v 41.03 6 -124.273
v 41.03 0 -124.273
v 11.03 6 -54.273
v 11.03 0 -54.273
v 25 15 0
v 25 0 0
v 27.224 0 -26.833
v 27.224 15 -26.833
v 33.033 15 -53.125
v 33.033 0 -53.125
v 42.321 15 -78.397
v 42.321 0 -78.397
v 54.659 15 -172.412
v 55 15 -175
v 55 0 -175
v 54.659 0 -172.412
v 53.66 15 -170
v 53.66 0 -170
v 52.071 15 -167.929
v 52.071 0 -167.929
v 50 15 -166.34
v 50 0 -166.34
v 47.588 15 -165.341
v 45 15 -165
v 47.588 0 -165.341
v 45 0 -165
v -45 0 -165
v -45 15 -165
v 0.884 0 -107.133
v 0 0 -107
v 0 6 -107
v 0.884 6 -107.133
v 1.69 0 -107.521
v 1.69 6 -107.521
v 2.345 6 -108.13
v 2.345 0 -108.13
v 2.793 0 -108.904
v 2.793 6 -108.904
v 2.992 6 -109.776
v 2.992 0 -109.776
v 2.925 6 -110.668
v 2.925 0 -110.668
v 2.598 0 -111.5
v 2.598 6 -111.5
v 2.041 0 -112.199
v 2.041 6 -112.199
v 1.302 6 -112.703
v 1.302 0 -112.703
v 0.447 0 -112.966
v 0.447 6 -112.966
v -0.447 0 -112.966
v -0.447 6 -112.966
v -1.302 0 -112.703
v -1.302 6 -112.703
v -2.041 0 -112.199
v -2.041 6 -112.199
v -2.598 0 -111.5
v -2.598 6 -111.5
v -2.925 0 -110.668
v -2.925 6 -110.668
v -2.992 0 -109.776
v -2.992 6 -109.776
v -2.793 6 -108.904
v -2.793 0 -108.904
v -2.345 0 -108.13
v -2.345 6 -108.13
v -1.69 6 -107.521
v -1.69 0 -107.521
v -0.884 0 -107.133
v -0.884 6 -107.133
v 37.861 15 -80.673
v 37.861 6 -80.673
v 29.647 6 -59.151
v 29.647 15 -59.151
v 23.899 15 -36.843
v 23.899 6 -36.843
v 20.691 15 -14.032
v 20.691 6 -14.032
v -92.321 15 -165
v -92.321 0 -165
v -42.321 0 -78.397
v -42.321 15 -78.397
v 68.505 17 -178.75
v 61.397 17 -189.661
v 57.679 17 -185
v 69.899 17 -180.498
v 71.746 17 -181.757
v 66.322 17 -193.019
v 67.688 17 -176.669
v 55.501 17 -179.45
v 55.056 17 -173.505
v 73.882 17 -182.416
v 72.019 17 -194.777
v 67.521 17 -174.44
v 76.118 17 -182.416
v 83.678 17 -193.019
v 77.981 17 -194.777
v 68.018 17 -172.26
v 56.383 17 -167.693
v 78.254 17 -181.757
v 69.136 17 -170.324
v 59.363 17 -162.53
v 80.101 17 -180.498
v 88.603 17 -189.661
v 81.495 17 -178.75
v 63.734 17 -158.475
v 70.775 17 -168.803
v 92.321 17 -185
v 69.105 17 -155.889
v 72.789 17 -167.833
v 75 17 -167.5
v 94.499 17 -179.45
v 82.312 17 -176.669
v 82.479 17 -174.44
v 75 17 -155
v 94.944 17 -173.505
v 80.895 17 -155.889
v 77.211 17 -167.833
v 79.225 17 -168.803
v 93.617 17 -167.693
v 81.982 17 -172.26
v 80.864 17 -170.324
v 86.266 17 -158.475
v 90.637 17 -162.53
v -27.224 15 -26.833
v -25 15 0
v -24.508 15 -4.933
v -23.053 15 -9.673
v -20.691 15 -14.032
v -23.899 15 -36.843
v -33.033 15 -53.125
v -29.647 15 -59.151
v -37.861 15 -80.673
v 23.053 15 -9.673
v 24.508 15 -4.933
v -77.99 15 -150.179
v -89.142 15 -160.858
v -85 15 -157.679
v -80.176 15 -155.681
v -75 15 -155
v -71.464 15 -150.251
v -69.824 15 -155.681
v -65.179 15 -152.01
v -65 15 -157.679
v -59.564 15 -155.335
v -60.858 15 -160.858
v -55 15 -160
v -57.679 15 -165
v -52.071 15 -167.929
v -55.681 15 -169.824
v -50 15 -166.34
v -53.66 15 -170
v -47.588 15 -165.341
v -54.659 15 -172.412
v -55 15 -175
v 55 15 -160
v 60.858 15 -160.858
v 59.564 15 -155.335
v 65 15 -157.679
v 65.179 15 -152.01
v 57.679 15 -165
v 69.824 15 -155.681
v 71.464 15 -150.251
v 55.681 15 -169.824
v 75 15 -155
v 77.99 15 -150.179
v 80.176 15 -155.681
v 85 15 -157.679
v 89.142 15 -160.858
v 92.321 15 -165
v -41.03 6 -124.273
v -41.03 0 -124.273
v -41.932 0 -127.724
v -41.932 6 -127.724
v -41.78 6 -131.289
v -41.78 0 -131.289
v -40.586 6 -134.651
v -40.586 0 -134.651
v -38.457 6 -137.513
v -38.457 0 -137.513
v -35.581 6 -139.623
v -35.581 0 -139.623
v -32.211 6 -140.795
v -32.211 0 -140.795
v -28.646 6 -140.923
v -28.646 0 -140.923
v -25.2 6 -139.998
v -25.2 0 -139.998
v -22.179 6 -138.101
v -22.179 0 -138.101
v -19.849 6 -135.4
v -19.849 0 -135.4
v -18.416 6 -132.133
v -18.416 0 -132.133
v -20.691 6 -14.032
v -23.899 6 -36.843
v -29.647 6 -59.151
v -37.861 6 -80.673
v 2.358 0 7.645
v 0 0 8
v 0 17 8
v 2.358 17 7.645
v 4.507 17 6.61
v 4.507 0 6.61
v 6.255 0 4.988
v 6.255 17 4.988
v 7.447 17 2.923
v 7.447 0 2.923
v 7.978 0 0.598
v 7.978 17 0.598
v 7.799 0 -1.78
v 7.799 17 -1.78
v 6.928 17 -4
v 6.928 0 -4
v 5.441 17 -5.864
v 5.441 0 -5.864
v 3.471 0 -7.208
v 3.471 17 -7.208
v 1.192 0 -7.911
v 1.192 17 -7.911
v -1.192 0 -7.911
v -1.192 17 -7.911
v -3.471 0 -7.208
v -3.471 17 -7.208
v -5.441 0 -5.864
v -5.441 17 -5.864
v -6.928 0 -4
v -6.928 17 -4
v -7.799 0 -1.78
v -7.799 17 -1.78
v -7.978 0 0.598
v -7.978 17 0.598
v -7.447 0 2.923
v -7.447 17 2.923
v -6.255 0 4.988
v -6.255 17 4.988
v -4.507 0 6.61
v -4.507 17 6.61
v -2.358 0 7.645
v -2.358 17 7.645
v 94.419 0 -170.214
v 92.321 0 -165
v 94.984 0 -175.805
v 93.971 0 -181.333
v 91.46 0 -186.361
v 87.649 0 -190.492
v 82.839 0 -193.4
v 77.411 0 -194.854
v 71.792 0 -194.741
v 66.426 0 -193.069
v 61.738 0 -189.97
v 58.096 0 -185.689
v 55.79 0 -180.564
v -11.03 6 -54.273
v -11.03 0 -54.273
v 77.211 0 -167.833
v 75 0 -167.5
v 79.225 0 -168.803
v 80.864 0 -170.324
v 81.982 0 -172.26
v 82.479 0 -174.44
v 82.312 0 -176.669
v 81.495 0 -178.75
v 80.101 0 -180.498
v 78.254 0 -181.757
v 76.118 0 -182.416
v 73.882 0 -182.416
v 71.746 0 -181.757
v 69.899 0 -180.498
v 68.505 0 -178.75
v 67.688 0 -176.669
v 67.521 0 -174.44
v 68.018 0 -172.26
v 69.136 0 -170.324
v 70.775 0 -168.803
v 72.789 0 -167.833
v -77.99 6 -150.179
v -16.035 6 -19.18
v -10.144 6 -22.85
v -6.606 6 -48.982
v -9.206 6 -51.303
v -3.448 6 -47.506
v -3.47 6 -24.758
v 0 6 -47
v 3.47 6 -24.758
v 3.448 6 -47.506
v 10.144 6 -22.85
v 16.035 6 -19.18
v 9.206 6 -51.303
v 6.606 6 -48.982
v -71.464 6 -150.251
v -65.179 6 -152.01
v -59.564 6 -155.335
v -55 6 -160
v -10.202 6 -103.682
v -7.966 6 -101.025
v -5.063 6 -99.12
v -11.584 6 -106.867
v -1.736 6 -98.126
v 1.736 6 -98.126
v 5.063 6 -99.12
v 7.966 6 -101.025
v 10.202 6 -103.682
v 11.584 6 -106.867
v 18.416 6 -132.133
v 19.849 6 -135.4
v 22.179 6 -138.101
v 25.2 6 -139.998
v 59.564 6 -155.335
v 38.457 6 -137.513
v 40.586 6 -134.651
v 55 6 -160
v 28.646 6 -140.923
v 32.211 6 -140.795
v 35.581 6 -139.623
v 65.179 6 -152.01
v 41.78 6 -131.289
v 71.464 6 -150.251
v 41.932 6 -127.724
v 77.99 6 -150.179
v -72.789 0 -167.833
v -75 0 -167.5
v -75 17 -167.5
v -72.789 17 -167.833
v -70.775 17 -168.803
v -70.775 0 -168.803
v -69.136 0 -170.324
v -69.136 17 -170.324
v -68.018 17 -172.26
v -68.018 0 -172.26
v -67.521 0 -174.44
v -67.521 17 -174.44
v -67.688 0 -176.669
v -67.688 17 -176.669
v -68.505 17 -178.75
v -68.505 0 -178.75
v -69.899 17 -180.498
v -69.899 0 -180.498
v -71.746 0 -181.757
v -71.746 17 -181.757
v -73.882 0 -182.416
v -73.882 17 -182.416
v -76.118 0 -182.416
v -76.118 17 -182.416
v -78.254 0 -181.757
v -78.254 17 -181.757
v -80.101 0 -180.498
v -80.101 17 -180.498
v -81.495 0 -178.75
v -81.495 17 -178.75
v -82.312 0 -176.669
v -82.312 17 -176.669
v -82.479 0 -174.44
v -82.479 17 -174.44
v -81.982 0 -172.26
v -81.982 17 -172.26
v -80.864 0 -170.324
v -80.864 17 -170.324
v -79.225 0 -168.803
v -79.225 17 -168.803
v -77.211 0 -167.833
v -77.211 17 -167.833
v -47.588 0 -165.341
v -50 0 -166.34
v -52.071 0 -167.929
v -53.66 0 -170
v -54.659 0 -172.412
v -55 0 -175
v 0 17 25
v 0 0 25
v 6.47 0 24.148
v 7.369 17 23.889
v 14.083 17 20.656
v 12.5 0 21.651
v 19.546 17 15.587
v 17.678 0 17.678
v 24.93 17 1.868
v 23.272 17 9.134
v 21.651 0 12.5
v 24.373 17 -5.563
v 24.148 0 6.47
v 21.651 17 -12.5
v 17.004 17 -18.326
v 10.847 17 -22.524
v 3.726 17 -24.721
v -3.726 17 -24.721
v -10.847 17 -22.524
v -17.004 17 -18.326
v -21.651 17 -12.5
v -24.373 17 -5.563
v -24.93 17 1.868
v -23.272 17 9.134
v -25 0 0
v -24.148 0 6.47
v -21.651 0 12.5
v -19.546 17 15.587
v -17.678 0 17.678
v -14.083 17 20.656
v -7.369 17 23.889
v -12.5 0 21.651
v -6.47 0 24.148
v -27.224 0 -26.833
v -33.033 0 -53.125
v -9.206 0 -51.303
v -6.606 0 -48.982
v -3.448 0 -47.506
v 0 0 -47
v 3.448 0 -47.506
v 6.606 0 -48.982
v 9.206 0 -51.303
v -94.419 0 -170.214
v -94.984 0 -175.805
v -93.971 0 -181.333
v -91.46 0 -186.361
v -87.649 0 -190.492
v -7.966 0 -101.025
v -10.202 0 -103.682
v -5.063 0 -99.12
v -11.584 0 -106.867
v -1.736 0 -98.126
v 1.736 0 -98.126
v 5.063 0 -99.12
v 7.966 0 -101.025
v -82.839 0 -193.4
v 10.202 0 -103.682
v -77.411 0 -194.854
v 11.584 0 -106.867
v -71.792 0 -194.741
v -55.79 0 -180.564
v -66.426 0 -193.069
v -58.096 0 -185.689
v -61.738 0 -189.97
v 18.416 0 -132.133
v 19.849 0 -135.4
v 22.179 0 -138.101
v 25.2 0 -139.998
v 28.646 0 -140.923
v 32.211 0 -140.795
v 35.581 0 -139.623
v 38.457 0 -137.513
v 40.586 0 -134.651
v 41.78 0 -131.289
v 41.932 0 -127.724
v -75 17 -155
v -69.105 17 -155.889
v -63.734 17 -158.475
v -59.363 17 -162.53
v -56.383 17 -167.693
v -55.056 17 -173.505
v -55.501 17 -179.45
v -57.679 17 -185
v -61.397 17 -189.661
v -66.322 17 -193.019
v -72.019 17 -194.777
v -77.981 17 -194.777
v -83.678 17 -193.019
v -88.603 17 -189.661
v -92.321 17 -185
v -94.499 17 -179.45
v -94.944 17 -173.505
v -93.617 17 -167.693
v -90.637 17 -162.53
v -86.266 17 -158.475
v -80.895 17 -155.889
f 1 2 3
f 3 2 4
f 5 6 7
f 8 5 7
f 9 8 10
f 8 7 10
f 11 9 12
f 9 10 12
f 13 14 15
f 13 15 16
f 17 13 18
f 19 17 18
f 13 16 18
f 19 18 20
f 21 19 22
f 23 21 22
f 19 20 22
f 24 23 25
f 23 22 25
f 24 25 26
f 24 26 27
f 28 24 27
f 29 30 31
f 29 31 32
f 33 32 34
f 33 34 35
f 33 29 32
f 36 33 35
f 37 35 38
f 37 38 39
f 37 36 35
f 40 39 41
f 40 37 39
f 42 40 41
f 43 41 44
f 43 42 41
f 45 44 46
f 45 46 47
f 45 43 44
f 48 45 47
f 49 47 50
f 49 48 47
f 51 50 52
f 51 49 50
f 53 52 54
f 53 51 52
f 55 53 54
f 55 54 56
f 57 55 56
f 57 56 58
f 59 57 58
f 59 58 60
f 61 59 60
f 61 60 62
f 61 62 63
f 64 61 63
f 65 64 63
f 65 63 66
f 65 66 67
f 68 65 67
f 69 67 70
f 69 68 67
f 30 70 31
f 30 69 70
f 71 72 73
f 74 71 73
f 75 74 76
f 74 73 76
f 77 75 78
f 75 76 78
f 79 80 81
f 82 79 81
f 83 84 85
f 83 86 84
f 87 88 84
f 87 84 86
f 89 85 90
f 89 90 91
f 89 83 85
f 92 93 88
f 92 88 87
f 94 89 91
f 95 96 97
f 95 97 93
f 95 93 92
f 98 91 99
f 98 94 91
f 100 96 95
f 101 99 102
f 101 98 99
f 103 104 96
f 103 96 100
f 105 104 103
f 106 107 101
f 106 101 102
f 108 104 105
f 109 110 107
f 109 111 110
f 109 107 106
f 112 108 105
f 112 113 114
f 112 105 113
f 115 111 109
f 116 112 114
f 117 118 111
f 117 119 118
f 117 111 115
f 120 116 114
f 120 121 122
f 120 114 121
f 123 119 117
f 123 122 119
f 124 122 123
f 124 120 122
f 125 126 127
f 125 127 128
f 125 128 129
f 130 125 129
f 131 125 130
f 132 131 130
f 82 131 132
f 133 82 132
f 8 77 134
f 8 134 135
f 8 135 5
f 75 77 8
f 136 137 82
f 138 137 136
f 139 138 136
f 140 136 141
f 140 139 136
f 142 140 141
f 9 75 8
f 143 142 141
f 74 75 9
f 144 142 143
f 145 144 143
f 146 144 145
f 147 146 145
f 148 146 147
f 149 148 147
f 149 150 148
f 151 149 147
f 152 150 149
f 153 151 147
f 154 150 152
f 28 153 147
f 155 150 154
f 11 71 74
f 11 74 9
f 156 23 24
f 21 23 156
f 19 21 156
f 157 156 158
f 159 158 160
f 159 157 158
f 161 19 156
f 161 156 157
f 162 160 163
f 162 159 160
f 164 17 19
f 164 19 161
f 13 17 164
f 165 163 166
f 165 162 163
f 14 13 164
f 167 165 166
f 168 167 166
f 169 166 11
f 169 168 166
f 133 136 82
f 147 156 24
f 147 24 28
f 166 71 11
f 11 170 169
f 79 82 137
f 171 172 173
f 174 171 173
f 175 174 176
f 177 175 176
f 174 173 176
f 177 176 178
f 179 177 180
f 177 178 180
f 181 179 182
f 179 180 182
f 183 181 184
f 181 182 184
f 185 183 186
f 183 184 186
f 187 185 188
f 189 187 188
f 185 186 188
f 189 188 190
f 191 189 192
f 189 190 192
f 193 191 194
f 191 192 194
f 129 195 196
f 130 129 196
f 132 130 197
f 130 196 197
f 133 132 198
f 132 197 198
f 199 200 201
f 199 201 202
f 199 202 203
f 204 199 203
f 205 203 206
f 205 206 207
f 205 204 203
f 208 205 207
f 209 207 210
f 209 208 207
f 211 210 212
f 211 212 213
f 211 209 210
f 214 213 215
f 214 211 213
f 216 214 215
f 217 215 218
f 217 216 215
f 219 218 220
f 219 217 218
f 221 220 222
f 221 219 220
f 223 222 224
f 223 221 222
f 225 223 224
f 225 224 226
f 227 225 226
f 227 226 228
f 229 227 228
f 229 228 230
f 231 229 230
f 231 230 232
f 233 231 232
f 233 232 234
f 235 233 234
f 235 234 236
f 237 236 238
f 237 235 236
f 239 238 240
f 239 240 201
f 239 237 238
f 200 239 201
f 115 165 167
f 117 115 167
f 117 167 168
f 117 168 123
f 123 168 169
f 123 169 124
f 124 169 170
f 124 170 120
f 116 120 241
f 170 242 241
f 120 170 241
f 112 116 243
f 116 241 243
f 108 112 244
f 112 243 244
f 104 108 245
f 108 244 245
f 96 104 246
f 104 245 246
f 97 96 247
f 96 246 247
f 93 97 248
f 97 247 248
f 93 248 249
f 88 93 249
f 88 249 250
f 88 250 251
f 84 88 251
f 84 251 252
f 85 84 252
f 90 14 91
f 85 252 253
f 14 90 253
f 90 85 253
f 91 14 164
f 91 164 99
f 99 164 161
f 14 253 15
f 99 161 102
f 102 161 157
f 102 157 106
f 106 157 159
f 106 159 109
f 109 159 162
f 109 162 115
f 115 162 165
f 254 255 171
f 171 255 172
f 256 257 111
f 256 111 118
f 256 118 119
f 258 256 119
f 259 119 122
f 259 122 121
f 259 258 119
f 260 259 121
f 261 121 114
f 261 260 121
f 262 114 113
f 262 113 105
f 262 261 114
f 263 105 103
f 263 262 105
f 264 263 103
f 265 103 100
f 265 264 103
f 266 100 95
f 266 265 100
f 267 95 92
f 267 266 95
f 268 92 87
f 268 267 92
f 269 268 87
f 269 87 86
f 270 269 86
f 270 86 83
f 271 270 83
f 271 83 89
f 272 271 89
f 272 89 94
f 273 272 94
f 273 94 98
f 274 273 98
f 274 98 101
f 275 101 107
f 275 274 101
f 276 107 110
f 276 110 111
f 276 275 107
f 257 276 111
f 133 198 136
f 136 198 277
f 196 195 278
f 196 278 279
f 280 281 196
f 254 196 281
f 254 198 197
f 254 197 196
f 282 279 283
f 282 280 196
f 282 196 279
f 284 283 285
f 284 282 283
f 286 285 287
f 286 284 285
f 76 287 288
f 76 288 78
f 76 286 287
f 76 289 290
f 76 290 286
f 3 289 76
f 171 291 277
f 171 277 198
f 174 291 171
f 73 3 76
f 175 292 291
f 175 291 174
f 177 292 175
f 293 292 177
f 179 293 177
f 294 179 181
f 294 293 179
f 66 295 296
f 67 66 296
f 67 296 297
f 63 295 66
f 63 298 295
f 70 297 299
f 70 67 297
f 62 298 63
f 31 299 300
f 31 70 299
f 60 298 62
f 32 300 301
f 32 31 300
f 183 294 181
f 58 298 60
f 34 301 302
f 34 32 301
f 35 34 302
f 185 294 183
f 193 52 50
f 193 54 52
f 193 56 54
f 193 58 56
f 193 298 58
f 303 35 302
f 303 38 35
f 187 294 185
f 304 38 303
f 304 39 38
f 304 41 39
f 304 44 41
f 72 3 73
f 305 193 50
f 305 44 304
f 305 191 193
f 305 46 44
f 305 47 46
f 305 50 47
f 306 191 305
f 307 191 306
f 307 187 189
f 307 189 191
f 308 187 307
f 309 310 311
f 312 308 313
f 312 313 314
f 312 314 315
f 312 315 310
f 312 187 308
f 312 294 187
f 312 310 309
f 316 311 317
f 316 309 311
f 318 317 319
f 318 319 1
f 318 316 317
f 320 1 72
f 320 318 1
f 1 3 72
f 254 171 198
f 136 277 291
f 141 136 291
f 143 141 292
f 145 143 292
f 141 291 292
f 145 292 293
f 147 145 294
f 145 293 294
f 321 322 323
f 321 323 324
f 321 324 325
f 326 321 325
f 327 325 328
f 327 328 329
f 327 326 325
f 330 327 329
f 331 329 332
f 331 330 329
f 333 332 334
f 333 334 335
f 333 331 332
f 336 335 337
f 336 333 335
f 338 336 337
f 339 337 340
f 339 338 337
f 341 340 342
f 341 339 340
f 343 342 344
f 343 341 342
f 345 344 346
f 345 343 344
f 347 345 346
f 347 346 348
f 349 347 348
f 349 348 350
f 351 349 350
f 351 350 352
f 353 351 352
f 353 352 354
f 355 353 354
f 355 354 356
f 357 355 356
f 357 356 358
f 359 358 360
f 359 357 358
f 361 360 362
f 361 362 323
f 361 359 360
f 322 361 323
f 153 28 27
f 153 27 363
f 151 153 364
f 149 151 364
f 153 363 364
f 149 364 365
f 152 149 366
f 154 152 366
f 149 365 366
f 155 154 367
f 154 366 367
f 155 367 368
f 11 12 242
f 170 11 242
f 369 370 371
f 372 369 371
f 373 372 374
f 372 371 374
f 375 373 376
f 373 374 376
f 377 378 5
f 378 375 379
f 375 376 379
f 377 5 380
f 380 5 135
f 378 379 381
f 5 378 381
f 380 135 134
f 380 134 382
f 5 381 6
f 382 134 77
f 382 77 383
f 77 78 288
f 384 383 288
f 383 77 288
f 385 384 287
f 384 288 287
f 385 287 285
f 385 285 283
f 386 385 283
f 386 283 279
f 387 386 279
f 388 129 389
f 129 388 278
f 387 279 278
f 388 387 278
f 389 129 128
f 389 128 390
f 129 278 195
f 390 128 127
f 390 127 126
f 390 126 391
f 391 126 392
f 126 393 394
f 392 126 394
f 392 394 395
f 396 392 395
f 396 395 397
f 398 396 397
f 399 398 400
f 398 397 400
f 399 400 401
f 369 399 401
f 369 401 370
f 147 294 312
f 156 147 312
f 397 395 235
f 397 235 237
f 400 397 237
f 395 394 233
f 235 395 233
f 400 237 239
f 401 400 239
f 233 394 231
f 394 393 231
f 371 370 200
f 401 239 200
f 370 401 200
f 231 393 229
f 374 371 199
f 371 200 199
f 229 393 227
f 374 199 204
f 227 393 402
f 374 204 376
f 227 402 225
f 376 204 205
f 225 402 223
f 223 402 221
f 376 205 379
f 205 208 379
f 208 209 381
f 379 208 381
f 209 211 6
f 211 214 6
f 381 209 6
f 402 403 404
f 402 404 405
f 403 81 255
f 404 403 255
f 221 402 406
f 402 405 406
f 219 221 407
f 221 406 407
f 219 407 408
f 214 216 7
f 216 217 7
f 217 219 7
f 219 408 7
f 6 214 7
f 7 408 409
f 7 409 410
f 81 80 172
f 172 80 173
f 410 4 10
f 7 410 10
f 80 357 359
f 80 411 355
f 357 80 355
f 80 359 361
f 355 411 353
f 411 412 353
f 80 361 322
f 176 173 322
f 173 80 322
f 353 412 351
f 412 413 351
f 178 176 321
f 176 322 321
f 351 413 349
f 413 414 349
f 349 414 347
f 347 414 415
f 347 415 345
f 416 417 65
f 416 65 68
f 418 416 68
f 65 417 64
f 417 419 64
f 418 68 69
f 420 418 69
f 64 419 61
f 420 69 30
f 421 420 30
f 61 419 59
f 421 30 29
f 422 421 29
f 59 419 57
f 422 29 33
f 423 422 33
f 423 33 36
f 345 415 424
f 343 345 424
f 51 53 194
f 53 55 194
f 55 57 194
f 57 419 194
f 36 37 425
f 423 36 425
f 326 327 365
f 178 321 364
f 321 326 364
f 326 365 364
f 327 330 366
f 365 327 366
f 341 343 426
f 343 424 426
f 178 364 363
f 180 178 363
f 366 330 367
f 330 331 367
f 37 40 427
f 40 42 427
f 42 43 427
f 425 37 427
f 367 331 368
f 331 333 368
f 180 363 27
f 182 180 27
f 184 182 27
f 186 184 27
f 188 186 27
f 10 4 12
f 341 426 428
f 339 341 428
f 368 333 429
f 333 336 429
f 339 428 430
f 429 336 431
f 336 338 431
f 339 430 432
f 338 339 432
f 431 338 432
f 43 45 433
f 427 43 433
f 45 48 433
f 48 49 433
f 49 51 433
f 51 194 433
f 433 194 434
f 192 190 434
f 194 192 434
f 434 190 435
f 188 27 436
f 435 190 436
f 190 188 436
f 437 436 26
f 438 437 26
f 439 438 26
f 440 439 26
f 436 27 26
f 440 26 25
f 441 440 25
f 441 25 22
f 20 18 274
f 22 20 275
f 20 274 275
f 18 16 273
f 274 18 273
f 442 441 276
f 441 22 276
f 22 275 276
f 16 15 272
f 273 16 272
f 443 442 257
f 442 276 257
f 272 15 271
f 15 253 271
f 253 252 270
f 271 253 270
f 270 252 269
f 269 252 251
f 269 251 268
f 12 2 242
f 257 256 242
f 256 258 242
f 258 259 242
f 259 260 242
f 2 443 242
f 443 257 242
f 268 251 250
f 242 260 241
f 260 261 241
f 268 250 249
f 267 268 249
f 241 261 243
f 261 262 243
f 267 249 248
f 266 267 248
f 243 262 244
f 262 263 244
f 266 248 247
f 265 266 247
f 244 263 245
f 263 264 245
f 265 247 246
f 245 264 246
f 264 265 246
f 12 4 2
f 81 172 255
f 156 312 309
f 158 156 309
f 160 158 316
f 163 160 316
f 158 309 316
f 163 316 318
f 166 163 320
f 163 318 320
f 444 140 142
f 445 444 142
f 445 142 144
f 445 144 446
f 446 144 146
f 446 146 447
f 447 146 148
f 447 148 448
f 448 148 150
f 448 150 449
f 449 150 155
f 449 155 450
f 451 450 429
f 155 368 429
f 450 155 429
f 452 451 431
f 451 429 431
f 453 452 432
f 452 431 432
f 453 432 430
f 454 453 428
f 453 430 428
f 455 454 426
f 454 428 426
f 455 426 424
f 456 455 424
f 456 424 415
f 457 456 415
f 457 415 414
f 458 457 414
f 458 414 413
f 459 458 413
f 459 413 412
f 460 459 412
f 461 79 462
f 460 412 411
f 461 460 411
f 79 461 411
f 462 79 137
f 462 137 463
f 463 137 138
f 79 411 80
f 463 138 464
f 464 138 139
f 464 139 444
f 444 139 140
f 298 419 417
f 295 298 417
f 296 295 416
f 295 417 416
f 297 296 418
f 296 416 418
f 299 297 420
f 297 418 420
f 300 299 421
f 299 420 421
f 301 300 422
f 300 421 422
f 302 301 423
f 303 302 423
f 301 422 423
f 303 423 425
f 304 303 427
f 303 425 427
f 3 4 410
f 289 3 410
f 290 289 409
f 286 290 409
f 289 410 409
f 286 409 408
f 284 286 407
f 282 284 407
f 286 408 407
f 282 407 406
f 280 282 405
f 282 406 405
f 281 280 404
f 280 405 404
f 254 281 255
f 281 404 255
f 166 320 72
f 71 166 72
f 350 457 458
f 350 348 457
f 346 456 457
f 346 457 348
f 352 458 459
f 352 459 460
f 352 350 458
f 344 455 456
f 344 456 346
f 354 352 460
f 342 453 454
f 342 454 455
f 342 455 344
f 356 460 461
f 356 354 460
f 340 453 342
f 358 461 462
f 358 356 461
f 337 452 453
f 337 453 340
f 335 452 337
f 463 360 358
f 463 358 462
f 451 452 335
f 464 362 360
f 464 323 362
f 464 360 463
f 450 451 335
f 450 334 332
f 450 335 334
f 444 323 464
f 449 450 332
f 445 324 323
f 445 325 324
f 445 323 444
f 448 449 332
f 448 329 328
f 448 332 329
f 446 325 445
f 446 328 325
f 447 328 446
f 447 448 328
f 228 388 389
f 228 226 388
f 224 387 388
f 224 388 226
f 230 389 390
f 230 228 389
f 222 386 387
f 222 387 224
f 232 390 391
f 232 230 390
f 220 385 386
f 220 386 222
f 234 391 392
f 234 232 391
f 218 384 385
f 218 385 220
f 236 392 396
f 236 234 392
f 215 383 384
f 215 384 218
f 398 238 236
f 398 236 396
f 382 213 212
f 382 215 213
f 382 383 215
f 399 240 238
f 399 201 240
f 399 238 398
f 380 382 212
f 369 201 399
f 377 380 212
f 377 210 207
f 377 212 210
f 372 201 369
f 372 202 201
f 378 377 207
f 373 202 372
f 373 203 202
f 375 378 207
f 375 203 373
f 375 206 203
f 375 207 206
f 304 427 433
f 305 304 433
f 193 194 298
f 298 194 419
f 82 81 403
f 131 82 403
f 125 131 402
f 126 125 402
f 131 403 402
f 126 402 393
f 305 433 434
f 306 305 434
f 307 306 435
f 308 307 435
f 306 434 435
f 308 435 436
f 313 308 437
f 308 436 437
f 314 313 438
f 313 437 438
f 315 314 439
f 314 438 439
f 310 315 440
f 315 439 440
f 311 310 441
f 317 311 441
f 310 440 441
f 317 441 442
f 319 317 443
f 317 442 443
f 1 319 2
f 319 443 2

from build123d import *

# Parameters (mm, degrees)
SKETCH1_R             = 25
SKETCH1_R_2           = 8
BOSS_EXTRUDE1_DEPTH   = 17
SKETCH1_R_3           = 20
SKETCH1_R_4           = 7.5
BOSS_EXTRUDE1_2_DEPTH = 17
BOSS_EXTRUDE1_3_DEPTH = 17
BOSS_EXTRUDE4_DEPTH   = 15
SKETCH1_12_R          = 3
BOSS_EXTRUDE5_DEPTH   = 6


with BuildPart() as part:
    # Sketch1 → Boss-Extrude1 (new body)
    with BuildSketch(Plane(origin=(0, 0, 0), x_dir=(1, 0, 0), z_dir=(0, 1, 0))):
        Circle(SKETCH1_R)
        Circle(SKETCH1_R_2, mode=Mode.SUBTRACT)
    extrude(amount=BOSS_EXTRUDE1_DEPTH)



with BuildPart() as body_2:
    # Sketch1 → Boss-Extrude1 2 (new body)
    with BuildSketch(Plane(origin=(0, 0, 0), x_dir=(1, 0, 0), z_dir=(0, 1, 0))):
        with Locations((-75, 175)):
            Circle(SKETCH1_R_3)
        with Locations((-75, 175)):
            Circle(SKETCH1_R_4, mode=Mode.SUBTRACT)
    extrude(amount=BOSS_EXTRUDE1_2_DEPTH)


with BuildPart() as body_3:
    # Sketch1 → Boss-Extrude1 3 (new body)
    with BuildSketch(Plane(origin=(0, 0, 0), x_dir=(1, 0, 0), z_dir=(0, 1, 0))):
        with Locations((75, 175)):
            Circle(SKETCH1_R_3)
        with Locations((75, 175)):
            Circle(SKETCH1_R_4, mode=Mode.SUBTRACT)
    extrude(amount=BOSS_EXTRUDE1_3_DEPTH)


with BuildPart() as part_1:
    add(part.part)

    add(body_2.part)  # Boss-Extrude4 merges body 2

    add(body_3.part)  # Boss-Extrude4 merges body 3
    # Sketch1<11> → Boss-Extrude4 (add)
    with BuildSketch(Plane(origin=(0, 0, 0), x_dir=(1, 0, 0), z_dir=(0, 1, 0))):
        with BuildLine():
            Line((-37.860985847, 80.673340544), (-77.990381057, 150.179491924))
            ThreePointArc((-77.990381057, 150.179491924), (-65.179491924, 152.009618943), (-55, 160))
            Line((-55, 160), (55, 160))
            ThreePointArc((55, 160), (65.179491924, 152.009618943), (77.990381057, 150.179491924))
            Line((77.990381057, 150.179491924), (37.860985847, 80.673340544))
            ThreePointArc((37.860985847, 80.673340544), (26.459547, 48.078091436), (20.690948252, 14.031559444))
            ThreePointArc((20.690948252, 14.031559444), (23.898469682, 7.339151643), (25, 0))
            ThreePointArc((25, 0), (29.68582744, 40.076807855), (42.320508076, 78.397459622))
            Line((42.320508076, 78.397459622), (92.320508076, 165))
            ThreePointArc((92.320508076, 165), (69.823619098, 155.681483474), (55, 175))
            ThreePointArc((55, 175), (52.071067812, 167.928932188), (45, 165))
            Line((45, 165), (0, 165))
            Line((0, 165), (-45, 165))
            ThreePointArc((-45, 165), (-52.071067812, 167.928932188), (-55, 175))
            ThreePointArc((-55, 175), (-69.823619098, 155.681483474), (-92.320508076, 165))
            Line((-92.320508076, 165), (-42.320508076, 78.397459622))
            ThreePointArc((-42.320508076, 78.397459622), (-29.68582744, 40.076807855), (-25, 0))
            ThreePointArc((-25, 0), (-23.898469682, 7.339151643), (-20.690948252, 14.031559444))
            ThreePointArc((-20.690948252, 14.031559444), (-26.459547, 48.078091436), (-37.860985847, 80.673340544))
        make_face()
    extrude(amount=BOSS_EXTRUDE4_DEPTH)

    # Sketch1<12> → Boss-Extrude5 (add)
    with BuildSketch(Plane(origin=(0, 0, 0), x_dir=(1, 0, 0), z_dir=(0, 1, 0))):
        with BuildLine():
            ThreePointArc((-55, 160), (-65.179491924, 152.009618943), (-77.990381057, 150.179491924))
            Line((-77.990381057, 150.179491924), (-37.860985847, 80.673340544))
            ThreePointArc((-37.860985847, 80.673340544), (-26.459547, 48.078091436), (-20.690948252, 14.031559444))
            ThreePointArc((-20.690948252, 14.031559444), (0, 25), (20.690948252, 14.031559444))
            ThreePointArc((20.690948252, 14.031559444), (26.459547, 48.078091436), (37.860985847, 80.673340544))
            Line((37.860985847, 80.673340544), (77.990381057, 150.179491924))
            ThreePointArc((77.990381057, 150.179491924), (65.179491924, 152.009618943), (55, 160))
            Line((55, 160), (-55, 160))
        make_face()
        with BuildLine():
            Line((41.02974036, 124.272968417), (11.02974036, 54.272968417))
            ThreePointArc((11.02974036, 54.272968417), (0, 47), (-11.02974036, 54.272968417))
            Line((-11.02974036, 54.272968417), (-41.02974036, 124.272968417))
            ThreePointArc((-41.02974036, 124.272968417), (-33.939530359, 140.334906288), (-18.416073702, 132.132515207))
            Line((-18.416073702, 132.132515207), (-11.583926298, 106.867484793))
            ThreePointArc((-11.583926298, 106.867484793), (0, 98), (11.583926298, 106.867484793))
            Line((11.583926298, 106.867484793), (18.416073702, 132.132515207))
            ThreePointArc((18.416073702, 132.132515207), (33.939530359, 140.334906288), (41.02974036, 124.272968417))
        make_face(mode=Mode.SUBTRACT)
        with Locations((0, 110)):
            Circle(SKETCH1_12_R, mode=Mode.SUBTRACT)
    extrude(amount=BOSS_EXTRUDE5_DEPTH)


solid = part_1.part
